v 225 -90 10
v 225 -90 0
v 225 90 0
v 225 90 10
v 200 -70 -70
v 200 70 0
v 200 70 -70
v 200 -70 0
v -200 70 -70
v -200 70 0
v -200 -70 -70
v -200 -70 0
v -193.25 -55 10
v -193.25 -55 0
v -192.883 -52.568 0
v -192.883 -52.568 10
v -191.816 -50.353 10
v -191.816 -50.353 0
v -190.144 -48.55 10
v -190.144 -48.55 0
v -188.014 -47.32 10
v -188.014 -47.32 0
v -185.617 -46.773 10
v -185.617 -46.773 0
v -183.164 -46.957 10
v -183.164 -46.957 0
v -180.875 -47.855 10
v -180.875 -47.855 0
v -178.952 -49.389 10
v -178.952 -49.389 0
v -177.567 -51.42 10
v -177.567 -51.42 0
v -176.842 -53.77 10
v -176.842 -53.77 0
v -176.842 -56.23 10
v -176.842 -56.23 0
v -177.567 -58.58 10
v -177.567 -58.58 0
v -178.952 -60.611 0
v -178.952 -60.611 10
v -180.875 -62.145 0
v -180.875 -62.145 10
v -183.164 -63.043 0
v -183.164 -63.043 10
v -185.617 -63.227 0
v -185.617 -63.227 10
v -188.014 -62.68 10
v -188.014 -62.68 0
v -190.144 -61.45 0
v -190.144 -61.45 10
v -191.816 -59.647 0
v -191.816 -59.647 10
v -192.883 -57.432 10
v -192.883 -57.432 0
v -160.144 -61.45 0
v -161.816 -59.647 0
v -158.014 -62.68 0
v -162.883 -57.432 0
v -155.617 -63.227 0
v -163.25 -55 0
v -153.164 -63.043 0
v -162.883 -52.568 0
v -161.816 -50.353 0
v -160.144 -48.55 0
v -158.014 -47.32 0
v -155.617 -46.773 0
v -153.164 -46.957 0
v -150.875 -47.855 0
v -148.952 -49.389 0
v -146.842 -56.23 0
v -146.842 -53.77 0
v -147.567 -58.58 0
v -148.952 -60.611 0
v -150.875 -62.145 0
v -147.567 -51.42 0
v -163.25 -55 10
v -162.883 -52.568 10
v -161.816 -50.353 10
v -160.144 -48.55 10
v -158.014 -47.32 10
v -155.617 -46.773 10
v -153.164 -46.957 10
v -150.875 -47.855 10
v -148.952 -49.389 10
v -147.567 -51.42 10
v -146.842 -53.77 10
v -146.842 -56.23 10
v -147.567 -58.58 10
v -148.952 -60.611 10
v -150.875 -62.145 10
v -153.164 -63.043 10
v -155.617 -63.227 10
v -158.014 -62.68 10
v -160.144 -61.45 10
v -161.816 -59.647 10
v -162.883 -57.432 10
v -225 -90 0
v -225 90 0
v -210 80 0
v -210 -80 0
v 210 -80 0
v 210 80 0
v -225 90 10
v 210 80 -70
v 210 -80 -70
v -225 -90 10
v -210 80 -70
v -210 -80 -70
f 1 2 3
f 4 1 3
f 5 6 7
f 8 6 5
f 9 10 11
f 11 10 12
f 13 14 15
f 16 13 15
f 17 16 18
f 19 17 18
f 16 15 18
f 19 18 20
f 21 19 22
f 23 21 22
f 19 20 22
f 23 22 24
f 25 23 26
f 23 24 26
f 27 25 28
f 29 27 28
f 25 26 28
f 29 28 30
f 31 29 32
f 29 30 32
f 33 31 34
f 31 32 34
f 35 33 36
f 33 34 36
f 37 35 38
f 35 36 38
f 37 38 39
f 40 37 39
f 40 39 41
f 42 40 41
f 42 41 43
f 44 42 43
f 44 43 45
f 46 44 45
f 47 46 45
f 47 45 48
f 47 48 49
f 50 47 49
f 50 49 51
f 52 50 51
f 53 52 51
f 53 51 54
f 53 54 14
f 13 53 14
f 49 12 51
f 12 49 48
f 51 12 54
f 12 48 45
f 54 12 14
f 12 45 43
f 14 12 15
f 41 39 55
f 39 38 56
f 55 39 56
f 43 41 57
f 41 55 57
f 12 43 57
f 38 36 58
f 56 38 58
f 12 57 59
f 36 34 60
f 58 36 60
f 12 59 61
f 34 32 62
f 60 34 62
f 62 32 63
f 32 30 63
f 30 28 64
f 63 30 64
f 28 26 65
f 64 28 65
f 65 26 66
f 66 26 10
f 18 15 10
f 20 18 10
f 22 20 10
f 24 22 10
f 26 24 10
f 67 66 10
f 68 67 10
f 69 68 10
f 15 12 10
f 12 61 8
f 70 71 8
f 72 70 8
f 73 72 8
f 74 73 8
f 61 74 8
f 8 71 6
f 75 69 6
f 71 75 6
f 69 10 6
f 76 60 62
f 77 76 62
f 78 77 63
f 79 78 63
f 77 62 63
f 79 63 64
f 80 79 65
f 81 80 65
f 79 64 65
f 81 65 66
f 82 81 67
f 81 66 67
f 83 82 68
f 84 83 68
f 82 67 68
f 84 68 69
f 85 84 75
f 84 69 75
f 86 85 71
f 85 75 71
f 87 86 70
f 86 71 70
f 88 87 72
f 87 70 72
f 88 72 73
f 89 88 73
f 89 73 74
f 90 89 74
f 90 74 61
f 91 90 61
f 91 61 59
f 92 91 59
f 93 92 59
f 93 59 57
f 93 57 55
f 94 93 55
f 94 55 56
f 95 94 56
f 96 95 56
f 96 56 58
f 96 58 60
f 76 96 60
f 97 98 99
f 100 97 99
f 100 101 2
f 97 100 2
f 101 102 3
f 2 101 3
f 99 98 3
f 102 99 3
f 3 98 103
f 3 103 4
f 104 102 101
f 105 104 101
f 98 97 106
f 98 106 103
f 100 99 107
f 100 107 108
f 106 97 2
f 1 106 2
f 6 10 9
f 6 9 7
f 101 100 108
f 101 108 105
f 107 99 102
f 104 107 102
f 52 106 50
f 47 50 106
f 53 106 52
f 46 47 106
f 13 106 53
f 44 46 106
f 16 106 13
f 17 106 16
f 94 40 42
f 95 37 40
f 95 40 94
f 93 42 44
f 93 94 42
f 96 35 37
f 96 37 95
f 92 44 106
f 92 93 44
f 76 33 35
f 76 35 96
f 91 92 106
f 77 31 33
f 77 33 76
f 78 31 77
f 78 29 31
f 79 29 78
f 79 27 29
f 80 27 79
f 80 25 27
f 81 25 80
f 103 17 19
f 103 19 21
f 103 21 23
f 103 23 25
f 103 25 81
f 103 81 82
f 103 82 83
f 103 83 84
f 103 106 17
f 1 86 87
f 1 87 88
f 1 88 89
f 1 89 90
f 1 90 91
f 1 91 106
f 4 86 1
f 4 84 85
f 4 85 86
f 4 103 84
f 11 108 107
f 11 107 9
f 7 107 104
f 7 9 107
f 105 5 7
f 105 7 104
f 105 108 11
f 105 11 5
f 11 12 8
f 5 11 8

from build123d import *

# Parameters (mm, degrees)
F0_W     = 450
F0_H     = 180
F1_DEPTH = 10
F2_W     = 420
F2_H     = 160
F2_W_2   = 400
F2_H_2   = 140
F3_DEPTH = 70
F5_D     = 16.5


with BuildPart() as f1:
    # F0 (on Top) → F1 (new body)
    with BuildSketch(Plane.XY):
        Rectangle(F0_W, F0_H)
    extrude(amount=F1_DEPTH)

    # F2 (on face) → F3 (join)
    with BuildSketch(Plane(origin=(0, 0, 0), x_dir=(1, 0, 0), z_dir=(0, 0, -1))):
        Rectangle(F2_W, F2_H)
        Rectangle(F2_W_2, F2_H_2, mode=Mode.SUBTRACT)
    extrude(amount=F3_DEPTH)

    # F5 (through all)
    with Locations(Plane.XY.offset(10)):
        with Locations((-185, -55), (-155, -55)):
            Hole(F5_D / 2)


solid = f1.part
